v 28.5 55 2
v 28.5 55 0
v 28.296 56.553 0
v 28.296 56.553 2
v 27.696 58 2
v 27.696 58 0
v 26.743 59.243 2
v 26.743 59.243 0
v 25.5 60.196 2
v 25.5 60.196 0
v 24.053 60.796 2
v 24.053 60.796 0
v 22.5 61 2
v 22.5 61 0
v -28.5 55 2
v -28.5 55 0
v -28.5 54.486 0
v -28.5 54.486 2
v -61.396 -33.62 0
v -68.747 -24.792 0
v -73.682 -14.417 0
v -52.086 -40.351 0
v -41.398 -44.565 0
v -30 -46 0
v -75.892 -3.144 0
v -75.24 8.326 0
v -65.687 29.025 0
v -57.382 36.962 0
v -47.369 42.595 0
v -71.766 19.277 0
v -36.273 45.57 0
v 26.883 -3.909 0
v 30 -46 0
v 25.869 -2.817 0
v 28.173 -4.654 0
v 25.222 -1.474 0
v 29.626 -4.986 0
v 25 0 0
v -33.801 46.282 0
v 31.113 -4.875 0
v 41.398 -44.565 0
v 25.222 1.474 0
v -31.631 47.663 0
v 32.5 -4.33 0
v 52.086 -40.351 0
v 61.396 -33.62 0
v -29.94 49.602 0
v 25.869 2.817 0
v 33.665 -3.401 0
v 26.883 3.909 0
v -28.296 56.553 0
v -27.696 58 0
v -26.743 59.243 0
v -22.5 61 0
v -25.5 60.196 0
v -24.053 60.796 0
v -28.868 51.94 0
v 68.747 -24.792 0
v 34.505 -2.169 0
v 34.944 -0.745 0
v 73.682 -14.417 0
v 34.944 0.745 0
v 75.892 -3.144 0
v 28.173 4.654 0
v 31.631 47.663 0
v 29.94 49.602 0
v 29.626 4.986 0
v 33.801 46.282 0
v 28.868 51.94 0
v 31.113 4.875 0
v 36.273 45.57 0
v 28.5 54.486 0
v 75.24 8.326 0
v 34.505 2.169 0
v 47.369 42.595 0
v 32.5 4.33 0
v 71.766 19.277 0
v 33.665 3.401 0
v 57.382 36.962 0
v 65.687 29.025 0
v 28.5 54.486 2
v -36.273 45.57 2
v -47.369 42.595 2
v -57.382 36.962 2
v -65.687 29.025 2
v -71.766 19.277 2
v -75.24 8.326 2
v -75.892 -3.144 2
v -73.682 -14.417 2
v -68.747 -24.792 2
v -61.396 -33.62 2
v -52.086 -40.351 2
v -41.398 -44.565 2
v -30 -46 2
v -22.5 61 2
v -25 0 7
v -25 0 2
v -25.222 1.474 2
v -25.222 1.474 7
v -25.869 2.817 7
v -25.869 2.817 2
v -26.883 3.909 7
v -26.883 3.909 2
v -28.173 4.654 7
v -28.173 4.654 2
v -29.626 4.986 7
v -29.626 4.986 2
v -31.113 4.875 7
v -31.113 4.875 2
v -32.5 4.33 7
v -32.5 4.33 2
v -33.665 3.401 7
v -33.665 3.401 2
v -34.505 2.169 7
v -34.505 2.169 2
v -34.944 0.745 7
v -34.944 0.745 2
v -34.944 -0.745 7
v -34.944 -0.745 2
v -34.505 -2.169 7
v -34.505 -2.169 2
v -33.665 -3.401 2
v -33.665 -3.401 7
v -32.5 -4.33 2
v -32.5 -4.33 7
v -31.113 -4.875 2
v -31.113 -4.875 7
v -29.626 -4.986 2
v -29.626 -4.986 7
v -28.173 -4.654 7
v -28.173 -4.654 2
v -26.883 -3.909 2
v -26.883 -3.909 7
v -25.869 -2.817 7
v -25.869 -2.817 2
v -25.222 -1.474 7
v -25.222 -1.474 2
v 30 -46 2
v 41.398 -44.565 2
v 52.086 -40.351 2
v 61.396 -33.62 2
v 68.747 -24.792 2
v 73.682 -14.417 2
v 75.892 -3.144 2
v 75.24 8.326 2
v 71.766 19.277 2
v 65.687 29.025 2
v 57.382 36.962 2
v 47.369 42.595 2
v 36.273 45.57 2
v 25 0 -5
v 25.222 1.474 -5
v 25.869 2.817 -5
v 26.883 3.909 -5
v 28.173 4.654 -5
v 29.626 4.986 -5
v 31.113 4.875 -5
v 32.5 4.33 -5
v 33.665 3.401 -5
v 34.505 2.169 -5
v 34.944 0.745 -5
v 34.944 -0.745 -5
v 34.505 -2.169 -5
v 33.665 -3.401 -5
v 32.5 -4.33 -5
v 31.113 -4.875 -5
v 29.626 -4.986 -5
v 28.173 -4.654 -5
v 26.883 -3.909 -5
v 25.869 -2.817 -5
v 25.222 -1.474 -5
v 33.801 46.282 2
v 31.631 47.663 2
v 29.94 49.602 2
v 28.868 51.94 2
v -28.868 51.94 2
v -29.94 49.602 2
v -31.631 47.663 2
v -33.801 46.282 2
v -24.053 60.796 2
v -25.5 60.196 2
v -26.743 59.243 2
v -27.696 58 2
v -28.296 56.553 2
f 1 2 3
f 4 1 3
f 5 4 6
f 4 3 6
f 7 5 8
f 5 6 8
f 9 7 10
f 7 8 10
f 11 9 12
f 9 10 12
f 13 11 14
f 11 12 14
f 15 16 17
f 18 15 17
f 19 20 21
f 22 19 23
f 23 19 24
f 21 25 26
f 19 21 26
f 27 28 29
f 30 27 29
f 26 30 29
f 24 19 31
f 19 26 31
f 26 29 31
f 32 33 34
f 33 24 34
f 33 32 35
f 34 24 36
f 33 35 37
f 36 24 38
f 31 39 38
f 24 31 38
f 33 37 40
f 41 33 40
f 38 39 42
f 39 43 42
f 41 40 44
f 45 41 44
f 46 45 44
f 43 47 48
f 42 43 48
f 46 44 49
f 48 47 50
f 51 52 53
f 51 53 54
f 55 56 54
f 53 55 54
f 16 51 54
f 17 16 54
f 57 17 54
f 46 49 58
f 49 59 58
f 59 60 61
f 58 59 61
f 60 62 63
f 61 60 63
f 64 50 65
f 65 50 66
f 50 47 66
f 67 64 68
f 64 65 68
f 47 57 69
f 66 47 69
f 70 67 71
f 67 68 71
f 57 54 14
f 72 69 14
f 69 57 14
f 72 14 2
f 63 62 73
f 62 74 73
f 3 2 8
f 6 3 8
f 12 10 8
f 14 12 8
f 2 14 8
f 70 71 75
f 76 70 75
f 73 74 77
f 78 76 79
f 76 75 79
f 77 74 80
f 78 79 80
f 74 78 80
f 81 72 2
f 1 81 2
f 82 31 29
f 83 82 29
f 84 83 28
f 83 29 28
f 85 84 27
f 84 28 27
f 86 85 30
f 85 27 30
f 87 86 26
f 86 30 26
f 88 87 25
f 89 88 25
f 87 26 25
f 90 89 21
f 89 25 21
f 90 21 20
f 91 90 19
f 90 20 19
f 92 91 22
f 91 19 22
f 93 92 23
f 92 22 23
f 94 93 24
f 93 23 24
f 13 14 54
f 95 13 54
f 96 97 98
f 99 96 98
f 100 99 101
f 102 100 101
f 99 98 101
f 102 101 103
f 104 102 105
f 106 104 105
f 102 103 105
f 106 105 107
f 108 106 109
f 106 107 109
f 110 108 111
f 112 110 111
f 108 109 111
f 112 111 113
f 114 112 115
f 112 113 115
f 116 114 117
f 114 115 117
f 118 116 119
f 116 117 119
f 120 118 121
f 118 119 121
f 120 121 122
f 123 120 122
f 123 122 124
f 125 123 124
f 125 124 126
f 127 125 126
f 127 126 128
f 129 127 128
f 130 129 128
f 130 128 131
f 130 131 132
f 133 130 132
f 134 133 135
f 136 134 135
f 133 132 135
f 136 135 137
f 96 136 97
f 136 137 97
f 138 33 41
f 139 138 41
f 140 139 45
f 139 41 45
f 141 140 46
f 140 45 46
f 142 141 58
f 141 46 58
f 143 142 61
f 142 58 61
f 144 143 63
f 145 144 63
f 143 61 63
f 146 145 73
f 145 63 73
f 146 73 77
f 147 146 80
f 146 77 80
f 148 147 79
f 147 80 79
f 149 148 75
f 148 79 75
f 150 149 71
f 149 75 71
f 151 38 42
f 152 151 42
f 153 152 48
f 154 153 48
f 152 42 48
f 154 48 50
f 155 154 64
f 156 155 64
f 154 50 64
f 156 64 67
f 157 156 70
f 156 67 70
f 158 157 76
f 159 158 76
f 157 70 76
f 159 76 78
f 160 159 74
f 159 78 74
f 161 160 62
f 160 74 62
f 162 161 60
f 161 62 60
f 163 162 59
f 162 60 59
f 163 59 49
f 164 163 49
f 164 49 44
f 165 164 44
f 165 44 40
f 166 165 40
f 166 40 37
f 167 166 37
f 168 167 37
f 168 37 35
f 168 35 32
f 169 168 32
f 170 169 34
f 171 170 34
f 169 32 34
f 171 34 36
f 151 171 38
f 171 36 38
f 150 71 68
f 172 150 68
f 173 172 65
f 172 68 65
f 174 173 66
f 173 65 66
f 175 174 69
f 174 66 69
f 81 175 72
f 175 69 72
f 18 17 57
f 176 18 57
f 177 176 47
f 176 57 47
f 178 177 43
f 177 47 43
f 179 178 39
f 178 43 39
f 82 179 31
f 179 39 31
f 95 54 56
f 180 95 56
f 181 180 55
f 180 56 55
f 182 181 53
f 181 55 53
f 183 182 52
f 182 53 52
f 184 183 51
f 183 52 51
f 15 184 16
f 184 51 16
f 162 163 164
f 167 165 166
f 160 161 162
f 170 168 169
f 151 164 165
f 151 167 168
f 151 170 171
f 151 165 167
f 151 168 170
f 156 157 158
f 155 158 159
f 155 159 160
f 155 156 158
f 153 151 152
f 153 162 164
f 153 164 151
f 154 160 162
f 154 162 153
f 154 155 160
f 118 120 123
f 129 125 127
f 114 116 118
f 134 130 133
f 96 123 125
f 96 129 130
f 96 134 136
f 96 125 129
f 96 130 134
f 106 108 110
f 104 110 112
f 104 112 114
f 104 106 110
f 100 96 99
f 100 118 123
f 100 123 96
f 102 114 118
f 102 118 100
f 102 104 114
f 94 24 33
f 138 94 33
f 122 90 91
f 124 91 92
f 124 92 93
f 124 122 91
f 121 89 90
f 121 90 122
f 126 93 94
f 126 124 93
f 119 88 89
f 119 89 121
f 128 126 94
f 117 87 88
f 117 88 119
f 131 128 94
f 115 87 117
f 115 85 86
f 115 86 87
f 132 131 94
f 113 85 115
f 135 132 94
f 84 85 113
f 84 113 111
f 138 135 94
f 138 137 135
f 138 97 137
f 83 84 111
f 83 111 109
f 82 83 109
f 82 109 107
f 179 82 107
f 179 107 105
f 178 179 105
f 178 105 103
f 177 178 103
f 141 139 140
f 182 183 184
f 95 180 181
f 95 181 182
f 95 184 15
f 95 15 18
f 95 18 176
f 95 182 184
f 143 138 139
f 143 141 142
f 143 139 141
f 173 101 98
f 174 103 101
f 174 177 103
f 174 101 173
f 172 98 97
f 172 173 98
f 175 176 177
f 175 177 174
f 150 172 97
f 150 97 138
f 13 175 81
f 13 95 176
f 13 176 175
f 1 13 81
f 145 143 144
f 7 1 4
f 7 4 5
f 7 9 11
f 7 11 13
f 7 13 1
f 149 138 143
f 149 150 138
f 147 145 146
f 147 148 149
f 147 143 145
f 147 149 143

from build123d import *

# Parameters (mm, degrees)
BOSS_EXTRUDE1_DEPTH = 2
SKETCH2_R           = 5
BOSS_EXTRUDE2_DEPTH = 5
SKETCH3_R           = 5
BOSS_EXTRUDE3_DEPTH = 5


with BuildPart() as part:
    # Sketch1 → Boss-Extrude1 (new body)
    with BuildSketch(Plane.XY):
        with BuildLine():
            Line((28.5, 54.486236794), (28.5, 55))
            ThreePointArc((28.5, 55), (26.742640687, 59.242640687), (22.5, 61))
            Line((22.5, 61), (-22.5, 61))
            ThreePointArc((-22.5, 61), (-26.742640687, 59.242640687), (-28.5, 55))
            Line((-28.5, 55), (-28.5, 54.486236794))
            ThreePointArc((-28.5, 54.486236794), (-30.715994747, 48.572078128), (-36.272727273, 45.570307137))
            ThreePointArc((-36.272727273, 45.570307137), (-75.892451058, -3.143713703), (-30, -46))
            Line((-30, -46), (30, -46))
            ThreePointArc((30, -46), (75.892451058, -3.143713703), (36.272727273, 45.570307137))
            ThreePointArc((36.272727273, 45.570307137), (30.715994747, 48.572078128), (28.5, 54.486236794))
        make_face()
    extrude(amount=BOSS_EXTRUDE1_DEPTH)

    # Sketch2 → Boss-Extrude2 (add)
    with BuildSketch(Plane.XY.offset(2)):
        with Locations((-30, 0)):
            Circle(SKETCH2_R)
    extrude(amount=BOSS_EXTRUDE2_DEPTH)

    # Sketch3 → Boss-Extrude3 (add)
    with BuildSketch(Plane(origin=(0, 0, 0), x_dir=(-1, 0, 0), z_dir=(0, 0, -1))):
        with Locations((-30, 0)):
            Circle(SKETCH3_R)
    extrude(amount=BOSS_EXTRUDE3_DEPTH)


solid = part.part
